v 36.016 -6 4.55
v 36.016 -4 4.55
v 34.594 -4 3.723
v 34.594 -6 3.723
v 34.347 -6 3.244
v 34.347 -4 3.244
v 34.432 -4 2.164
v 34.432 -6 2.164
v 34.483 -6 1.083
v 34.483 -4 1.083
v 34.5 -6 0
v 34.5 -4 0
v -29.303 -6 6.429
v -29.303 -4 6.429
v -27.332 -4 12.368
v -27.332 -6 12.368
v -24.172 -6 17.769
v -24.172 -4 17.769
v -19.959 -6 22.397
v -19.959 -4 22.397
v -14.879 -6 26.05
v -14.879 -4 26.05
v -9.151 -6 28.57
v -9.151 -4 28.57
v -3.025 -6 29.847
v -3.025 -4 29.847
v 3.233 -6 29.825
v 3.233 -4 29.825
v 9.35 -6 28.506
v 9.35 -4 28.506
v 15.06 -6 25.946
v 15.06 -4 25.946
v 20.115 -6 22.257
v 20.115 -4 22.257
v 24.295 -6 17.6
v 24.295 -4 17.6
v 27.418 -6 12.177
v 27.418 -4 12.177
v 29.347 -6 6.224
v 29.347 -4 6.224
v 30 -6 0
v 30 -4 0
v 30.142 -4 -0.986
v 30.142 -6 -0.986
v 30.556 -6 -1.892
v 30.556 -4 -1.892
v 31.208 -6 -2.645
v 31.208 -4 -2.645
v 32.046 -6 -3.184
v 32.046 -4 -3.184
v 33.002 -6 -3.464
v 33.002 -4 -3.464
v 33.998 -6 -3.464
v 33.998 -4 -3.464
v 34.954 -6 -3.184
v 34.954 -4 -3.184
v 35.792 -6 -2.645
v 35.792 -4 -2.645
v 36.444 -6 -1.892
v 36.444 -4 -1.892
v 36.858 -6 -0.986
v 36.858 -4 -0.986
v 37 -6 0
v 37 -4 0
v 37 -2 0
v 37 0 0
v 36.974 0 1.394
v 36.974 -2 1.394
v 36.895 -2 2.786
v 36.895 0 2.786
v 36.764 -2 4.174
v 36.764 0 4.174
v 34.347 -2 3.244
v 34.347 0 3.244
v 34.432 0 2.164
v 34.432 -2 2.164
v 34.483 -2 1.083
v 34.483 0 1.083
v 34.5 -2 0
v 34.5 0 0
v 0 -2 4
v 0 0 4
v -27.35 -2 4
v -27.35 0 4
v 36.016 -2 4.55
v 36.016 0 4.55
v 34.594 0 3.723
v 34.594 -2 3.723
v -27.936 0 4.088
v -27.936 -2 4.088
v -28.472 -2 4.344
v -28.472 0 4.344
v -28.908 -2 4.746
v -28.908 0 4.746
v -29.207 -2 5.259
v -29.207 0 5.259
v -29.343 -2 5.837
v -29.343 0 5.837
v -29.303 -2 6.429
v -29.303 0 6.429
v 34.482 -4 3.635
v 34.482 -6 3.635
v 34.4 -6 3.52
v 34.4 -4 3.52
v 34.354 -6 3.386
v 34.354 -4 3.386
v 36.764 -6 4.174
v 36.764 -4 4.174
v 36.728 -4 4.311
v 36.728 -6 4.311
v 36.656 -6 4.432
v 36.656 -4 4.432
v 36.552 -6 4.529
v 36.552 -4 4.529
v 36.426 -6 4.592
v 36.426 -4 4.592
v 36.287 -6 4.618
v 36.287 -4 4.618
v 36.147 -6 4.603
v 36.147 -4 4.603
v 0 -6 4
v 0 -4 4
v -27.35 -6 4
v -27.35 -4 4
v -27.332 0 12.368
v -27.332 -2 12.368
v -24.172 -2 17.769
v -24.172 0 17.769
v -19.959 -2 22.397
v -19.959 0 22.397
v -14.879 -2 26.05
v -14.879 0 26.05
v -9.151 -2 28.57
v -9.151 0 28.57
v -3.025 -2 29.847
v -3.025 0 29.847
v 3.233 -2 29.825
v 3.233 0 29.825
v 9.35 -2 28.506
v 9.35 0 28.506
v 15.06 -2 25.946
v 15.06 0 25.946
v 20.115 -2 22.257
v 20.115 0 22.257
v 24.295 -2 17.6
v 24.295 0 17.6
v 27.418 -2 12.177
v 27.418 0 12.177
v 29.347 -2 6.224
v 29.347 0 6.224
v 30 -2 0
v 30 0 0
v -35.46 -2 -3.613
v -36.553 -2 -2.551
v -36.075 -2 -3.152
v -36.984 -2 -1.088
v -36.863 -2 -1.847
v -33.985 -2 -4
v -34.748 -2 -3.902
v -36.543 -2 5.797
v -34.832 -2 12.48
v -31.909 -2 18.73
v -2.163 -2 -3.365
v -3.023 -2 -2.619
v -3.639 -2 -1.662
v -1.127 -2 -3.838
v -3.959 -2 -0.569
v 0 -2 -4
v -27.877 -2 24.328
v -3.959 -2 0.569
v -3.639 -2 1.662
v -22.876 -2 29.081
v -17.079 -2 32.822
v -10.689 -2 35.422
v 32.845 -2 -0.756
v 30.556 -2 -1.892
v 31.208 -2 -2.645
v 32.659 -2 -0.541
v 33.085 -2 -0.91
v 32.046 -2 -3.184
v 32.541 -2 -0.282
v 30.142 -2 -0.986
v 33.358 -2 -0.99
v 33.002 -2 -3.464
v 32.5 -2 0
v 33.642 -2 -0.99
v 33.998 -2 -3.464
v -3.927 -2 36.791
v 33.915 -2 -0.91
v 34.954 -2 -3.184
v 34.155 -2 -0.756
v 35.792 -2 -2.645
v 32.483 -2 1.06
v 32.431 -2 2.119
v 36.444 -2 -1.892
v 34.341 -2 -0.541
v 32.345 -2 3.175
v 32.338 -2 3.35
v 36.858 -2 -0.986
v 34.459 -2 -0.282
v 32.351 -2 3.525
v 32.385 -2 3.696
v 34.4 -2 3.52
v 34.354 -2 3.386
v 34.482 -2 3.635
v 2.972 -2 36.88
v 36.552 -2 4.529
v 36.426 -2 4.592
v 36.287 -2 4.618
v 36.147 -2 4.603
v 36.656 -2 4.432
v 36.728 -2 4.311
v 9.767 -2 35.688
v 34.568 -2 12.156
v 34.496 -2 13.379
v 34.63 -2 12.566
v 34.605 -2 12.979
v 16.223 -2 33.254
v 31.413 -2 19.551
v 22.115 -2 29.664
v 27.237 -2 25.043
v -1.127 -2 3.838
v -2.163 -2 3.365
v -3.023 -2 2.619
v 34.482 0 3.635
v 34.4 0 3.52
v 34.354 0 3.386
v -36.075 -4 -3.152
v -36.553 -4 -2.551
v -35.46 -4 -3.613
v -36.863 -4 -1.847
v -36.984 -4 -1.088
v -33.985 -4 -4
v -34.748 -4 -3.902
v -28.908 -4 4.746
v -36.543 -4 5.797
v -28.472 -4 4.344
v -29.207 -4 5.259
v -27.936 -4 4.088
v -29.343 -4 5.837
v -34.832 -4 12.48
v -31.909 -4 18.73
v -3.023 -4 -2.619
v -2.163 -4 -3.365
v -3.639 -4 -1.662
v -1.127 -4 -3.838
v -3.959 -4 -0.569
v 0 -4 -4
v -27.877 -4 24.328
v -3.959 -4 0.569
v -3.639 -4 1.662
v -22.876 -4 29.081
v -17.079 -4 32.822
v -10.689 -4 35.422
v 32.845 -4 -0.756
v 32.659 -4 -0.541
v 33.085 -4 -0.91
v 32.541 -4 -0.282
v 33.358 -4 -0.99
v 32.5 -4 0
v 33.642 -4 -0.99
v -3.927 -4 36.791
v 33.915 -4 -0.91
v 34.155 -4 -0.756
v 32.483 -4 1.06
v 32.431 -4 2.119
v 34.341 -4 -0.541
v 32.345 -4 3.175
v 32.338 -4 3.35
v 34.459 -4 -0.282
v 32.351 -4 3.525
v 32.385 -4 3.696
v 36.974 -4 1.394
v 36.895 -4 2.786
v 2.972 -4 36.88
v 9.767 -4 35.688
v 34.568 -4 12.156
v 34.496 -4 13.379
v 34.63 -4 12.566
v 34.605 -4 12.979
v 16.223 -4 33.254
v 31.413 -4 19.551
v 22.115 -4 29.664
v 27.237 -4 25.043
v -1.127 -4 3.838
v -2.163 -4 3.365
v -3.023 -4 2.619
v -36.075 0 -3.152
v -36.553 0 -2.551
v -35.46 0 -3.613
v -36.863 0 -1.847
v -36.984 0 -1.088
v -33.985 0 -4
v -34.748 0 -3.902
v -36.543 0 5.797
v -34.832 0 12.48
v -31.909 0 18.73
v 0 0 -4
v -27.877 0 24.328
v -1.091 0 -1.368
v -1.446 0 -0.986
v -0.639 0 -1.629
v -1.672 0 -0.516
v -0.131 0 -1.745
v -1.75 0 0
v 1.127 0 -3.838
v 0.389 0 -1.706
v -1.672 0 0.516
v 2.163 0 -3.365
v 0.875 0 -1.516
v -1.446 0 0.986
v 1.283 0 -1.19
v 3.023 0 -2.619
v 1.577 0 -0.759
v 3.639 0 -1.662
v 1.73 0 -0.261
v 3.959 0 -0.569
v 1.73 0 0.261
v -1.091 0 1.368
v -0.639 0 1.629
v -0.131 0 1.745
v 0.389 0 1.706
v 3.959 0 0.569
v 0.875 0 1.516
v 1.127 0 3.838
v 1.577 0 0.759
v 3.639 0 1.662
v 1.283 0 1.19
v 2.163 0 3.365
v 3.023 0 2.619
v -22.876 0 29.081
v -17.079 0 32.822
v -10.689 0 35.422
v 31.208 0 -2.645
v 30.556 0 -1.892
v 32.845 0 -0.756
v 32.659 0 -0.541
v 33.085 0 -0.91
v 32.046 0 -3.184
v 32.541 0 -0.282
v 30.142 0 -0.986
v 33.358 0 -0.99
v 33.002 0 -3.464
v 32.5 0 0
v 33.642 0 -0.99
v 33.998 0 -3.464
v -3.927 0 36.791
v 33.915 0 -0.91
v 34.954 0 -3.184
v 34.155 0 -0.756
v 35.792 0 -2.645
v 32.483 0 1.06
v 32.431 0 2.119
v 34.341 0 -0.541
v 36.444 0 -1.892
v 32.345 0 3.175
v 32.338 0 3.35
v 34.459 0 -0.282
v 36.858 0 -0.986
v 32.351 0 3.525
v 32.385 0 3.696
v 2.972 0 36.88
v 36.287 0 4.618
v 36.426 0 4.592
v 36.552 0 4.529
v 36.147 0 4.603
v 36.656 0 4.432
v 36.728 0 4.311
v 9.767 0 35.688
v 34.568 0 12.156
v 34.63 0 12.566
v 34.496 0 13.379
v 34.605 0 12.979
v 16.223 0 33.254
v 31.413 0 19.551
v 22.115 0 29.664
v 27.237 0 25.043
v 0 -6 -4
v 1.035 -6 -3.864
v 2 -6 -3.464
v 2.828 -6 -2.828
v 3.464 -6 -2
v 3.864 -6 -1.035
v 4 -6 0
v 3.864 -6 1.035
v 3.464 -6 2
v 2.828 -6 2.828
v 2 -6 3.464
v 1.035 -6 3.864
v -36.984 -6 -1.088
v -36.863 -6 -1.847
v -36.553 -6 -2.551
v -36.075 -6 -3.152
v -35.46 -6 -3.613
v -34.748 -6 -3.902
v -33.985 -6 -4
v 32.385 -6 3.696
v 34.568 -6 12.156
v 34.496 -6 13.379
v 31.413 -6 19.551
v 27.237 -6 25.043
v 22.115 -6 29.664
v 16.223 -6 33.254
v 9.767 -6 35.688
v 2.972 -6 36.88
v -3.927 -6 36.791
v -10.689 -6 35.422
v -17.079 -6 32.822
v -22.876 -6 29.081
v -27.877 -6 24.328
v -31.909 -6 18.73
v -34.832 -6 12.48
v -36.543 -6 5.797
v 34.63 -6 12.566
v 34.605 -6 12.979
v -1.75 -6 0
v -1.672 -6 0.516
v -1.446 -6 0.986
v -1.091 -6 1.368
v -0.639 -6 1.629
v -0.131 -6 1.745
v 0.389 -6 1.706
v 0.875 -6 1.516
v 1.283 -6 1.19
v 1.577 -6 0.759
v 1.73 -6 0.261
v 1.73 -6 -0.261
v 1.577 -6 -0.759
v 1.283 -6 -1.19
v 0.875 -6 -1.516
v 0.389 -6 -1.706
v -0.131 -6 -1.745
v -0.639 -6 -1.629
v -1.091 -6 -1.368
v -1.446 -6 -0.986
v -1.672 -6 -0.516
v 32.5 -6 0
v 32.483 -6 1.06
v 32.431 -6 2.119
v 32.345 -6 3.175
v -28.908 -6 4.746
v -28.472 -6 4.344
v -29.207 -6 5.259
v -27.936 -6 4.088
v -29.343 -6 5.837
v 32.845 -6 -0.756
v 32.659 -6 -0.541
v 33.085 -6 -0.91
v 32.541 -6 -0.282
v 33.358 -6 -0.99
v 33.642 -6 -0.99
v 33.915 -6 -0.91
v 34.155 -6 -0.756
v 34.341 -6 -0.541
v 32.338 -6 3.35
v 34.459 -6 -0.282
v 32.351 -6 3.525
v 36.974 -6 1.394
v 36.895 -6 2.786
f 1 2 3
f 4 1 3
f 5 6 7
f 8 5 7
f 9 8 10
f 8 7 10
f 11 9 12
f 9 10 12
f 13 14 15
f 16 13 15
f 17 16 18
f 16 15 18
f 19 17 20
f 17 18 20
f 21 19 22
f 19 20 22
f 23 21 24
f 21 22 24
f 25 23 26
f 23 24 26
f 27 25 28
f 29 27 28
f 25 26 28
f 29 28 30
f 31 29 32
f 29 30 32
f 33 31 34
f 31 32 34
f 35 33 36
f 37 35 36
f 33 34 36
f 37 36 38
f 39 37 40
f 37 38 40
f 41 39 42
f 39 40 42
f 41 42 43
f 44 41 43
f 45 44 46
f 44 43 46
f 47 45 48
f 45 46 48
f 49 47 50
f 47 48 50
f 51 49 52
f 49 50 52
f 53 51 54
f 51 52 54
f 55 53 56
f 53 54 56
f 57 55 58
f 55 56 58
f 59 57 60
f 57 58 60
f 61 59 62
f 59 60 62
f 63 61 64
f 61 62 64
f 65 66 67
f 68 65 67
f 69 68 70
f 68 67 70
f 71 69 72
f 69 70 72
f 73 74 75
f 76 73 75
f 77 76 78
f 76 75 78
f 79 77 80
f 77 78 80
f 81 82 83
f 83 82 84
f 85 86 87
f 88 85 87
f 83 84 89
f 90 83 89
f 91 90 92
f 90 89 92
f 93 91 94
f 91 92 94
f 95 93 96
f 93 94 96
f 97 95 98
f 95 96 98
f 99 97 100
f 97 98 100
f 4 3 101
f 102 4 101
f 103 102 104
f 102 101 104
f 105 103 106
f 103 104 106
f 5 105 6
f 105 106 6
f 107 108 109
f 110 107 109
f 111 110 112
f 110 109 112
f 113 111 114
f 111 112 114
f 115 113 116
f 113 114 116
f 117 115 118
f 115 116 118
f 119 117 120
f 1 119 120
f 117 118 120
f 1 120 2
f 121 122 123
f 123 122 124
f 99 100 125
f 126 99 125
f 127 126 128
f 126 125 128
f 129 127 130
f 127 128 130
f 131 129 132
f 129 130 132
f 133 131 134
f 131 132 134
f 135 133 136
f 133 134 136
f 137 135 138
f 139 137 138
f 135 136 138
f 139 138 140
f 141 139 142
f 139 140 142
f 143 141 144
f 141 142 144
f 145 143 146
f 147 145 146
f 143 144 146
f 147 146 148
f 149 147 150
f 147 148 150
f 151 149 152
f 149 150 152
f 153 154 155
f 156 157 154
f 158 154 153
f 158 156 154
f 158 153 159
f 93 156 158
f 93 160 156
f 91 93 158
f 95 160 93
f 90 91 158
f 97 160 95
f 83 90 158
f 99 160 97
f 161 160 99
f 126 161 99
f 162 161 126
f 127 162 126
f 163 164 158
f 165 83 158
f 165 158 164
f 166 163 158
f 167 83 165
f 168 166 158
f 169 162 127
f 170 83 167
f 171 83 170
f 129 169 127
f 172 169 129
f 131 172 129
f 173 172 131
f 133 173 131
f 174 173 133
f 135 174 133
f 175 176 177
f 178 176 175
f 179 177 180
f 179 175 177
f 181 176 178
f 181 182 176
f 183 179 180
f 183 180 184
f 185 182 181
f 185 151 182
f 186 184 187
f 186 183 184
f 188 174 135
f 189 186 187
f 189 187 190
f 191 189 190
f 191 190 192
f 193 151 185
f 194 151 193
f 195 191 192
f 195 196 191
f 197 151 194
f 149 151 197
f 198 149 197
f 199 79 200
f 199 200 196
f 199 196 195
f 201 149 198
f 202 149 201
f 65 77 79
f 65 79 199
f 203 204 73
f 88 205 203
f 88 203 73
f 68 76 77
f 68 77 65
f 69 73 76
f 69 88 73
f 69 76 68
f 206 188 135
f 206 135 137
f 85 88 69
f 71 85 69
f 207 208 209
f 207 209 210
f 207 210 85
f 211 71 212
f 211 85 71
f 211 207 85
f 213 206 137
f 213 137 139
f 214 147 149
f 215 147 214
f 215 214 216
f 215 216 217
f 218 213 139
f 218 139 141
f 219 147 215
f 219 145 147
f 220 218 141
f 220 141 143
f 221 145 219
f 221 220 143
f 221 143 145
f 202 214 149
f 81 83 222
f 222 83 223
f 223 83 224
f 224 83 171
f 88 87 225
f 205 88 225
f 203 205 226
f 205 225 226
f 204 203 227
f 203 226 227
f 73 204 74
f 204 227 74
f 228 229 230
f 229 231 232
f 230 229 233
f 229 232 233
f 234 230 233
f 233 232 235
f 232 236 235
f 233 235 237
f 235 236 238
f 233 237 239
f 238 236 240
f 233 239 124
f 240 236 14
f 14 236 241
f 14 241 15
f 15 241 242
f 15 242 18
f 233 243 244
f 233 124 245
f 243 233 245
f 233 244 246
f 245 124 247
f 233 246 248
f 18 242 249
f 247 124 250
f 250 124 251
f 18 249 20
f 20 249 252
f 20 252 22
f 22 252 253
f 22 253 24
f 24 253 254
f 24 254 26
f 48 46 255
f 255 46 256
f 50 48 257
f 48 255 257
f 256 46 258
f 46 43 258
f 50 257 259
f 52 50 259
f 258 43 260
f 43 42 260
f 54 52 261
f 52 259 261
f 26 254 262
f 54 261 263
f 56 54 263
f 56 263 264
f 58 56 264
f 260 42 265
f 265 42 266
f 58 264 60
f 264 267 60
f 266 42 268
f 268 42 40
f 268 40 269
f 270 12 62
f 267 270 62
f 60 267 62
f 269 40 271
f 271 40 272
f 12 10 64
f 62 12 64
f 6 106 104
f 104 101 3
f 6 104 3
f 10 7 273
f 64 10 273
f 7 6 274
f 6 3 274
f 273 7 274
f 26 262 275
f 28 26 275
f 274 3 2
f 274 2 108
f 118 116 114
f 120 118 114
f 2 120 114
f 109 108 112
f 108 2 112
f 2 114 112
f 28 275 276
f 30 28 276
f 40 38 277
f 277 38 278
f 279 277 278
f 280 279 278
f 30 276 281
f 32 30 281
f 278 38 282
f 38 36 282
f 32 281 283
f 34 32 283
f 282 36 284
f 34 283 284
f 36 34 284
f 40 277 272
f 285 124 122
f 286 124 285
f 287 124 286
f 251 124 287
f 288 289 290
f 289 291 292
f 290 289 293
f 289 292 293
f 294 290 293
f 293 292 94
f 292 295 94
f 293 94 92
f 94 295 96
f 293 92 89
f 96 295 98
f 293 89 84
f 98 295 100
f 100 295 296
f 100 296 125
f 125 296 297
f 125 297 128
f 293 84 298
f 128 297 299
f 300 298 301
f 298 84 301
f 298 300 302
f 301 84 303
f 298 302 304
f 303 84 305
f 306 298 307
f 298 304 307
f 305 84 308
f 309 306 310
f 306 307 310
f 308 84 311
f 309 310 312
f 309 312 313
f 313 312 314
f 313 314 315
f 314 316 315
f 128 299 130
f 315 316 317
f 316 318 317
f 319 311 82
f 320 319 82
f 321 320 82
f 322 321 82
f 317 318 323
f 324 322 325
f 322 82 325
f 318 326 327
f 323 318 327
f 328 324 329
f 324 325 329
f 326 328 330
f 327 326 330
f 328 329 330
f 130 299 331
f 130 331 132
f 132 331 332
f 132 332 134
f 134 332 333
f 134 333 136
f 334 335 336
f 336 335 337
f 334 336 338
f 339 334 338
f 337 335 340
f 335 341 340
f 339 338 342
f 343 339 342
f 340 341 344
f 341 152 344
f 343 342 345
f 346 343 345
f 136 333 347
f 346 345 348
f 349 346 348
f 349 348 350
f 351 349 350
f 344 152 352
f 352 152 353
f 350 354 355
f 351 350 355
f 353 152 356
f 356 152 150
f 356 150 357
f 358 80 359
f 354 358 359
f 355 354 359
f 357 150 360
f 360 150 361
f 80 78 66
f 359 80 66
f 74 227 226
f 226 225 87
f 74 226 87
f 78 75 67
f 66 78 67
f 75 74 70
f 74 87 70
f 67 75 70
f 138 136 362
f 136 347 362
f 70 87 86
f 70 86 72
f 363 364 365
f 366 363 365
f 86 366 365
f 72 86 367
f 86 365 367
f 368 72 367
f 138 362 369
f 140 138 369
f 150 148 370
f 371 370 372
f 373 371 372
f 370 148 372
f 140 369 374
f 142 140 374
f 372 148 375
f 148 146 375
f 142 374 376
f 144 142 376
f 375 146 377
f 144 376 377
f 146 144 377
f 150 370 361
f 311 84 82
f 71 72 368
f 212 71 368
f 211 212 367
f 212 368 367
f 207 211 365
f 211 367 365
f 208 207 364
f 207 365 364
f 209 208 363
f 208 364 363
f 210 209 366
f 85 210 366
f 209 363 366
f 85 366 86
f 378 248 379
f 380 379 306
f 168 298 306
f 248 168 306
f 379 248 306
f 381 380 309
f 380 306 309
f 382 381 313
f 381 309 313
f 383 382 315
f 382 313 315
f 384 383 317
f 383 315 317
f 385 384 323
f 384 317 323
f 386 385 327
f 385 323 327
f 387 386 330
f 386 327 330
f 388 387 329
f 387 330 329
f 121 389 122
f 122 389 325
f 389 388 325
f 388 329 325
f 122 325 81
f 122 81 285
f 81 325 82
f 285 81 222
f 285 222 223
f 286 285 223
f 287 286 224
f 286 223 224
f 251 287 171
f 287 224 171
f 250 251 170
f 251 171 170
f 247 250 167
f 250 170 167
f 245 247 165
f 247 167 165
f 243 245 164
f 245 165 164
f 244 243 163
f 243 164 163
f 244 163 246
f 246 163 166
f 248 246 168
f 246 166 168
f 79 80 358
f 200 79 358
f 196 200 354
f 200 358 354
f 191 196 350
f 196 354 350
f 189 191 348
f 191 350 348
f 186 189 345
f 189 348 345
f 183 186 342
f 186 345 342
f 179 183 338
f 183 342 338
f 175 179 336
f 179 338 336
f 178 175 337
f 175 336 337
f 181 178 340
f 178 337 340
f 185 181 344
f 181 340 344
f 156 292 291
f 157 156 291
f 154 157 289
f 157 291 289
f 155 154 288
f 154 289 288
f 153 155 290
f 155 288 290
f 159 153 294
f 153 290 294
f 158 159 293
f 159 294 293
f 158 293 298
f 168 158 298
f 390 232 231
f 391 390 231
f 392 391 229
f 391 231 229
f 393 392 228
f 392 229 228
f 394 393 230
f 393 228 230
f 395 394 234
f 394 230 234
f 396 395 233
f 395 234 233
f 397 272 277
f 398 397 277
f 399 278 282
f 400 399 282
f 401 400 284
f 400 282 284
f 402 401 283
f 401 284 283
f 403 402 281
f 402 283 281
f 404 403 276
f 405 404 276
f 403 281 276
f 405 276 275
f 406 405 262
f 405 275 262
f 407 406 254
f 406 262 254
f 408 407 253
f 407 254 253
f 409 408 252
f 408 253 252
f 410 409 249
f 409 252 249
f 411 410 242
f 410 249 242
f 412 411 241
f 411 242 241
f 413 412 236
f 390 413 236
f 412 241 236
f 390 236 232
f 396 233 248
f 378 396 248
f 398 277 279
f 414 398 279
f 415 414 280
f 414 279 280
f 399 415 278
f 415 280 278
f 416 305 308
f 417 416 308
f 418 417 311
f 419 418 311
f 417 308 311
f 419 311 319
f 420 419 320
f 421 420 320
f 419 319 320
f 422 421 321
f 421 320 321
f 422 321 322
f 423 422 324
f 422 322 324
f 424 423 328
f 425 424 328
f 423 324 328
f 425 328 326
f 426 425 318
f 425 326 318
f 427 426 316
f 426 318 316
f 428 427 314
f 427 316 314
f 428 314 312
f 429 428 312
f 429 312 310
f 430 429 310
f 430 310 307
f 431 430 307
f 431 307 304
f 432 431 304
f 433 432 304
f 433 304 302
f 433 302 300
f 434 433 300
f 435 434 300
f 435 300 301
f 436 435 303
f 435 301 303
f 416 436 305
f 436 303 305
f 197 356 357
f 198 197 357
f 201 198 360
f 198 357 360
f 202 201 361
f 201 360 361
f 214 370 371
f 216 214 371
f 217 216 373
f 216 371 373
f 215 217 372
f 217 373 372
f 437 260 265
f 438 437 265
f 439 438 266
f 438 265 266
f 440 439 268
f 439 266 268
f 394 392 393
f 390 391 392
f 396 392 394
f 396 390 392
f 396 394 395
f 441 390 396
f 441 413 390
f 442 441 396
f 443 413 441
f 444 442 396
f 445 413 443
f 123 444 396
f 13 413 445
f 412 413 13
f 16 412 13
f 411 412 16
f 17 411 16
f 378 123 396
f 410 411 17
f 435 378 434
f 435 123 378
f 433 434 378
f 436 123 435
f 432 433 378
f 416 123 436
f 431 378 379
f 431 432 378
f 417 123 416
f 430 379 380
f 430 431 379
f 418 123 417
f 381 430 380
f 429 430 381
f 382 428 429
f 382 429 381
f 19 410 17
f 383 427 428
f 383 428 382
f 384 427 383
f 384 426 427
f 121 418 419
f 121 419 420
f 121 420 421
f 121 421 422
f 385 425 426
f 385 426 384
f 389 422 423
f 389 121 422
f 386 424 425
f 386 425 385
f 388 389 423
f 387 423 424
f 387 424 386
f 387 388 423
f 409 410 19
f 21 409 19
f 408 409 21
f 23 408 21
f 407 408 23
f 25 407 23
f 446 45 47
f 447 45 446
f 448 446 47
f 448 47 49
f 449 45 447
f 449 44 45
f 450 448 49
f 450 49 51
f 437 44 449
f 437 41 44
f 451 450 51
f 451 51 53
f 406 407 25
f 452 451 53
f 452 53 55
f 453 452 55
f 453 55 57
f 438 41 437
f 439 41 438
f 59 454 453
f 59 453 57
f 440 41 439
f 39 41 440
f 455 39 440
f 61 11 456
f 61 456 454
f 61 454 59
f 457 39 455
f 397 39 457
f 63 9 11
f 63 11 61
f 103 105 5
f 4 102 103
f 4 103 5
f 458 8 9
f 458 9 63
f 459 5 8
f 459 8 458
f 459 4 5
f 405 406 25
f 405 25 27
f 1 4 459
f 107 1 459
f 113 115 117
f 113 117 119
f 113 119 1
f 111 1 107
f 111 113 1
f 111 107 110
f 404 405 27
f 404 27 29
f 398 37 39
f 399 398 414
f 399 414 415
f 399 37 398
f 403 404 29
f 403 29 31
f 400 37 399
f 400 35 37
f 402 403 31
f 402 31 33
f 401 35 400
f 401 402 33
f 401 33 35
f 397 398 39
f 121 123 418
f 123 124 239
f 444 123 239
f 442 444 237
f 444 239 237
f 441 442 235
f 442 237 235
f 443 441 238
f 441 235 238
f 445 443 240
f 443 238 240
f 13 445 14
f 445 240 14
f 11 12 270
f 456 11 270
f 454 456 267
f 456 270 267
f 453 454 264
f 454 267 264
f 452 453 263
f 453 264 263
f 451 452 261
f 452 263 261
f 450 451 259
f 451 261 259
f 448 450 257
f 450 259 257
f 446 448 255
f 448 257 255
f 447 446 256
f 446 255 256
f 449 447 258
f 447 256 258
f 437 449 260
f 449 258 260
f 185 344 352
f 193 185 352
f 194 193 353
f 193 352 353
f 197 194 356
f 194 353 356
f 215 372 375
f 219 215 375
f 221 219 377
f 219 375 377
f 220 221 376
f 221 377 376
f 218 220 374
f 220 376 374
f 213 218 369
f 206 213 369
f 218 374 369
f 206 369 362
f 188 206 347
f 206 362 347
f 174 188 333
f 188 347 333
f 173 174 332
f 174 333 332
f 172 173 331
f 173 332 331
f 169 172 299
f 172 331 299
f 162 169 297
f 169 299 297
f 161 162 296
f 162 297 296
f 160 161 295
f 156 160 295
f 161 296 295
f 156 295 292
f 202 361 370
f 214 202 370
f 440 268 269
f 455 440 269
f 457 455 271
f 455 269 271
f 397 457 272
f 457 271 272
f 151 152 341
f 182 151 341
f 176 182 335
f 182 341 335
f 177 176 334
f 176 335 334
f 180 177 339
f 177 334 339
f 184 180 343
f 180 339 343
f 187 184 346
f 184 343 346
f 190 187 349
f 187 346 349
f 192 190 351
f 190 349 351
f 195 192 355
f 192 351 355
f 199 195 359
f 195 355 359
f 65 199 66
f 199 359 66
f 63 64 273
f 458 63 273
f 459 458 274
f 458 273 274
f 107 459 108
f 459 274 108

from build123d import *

# Parameters (mm, degrees)
F1_DEPTH = 2
F3_DEPTH = 2
F5_DEPTH = 2
F6_R     = 1.75
F7_DEPTH = 6


with BuildPart() as f1:
    # F0 (on Front) → F1 (new body)
    with BuildSketch(Plane.XZ):
        with BuildLine():
            Line((36.0155949142, 4.5501915368), (34.5935707333, 3.7231953967))
            ThreePointArc((34.5935707333, 3.7231953967), (34.4002745916, 3.51961513), (34.3471502153, 3.2439593227))
            ThreePointArc((34.3471502153, 3.2439593227), (34.4617663682, 1.6237791679), (34.5, 0))
            ThreePointArc((34.5, 0), (33.5, -1), (32.5, 0))
            ThreePointArc((32.5, 0), (32.4611135591, 1.589372991), (32.344547292, 3.1749425938))
            ThreePointArc((32.344547292, 3.1749425938), (32.3418598815, 3.4374174131), (32.3849685604, 3.6963419093))
            Line((32.3849685604, 3.6963419093), (34.5683472951, 12.1558157161))
            ThreePointArc((34.5683472951, 12.1558157161), (34.6283647637, 12.7729522849), (34.4964834196, 13.3788127905))
            ThreePointArc((34.4964834196, 13.3788127905), (-7.3396727546, 36.2647101719), (-36.9839930773, -1.0882352941))
            ThreePointArc((-36.9839930773, -1.0882352941), (-36.075182574, -3.1522901619), (-33.9852909359, -4))
            Line((-33.9852909359, -4), (-29.7321374946, -4))
            Line((-29.7321374946, -4), (0, -4))
            ThreePointArc((0, -4), (4, 0), (0, 4))
            Line((0, 4), (-27.3495886624, 4))
            ThreePointArc((-27.3495886624, 4), (-28.9079761073, 4.7464336589), (-29.3031307097, 6.4285714286))
            ThreePointArc((-29.3031307097, 6.4285714286), (3.2331160442, 29.825273857), (30, 0))
            ThreePointArc((30, 0), (33.5, -3.5), (37, 0))
            ThreePointArc((37, 0), (36.9408945016, 2.0905294604), (36.7637668419, 4.1743799053))
            ThreePointArc((36.7637668419, 4.1743799053), (36.4913900405, 4.5647699812), (36.0155949142, 4.5501915368))
        make_face()
    extrude(amount=F1_DEPTH)

    # F2 (on face) → F3 (join)
    with BuildSketch(Plane.XZ.offset(2)):
        with BuildLine():
            ThreePointArc((0, -4), (2.8284271247, -2.8284271247), (4, 0))
            ThreePointArc((4, 0), (2.8284271247, 2.8284271247), (0, 4))
            ThreePointArc((0, 4), (-4, 0), (0, -4))
        make_face()
    extrude(amount=F3_DEPTH)

    # F4 (on face) → F5 (join)
    with BuildSketch(Plane.XZ.offset(4)):
        with BuildLine():
            Line((36.0155949142, 4.5501915368), (34.5935707333, 3.7231953967))
            ThreePointArc((34.5935707333, 3.7231953967), (34.4002745916, 3.51961513), (34.3471502153, 3.2439593227))
            ThreePointArc((34.3471502153, 3.2439593227), (34.4617663682, 1.6237791679), (34.5, 0))
            ThreePointArc((34.5, 0), (33.5, -1), (32.5, 0))
            ThreePointArc((32.5, 0), (32.4611135591, 1.589372991), (32.344547292, 3.1749425938))
            ThreePointArc((32.344547292, 3.1749425938), (32.3418598815, 3.4374174131), (32.3849685604, 3.6963419093))
            Line((32.3849685604, 3.6963419093), (34.5683472951, 12.1558157161))
            ThreePointArc((34.5683472951, 12.1558157161), (34.6283647637, 12.7729522849), (34.4964834196, 13.3788127905))
            ThreePointArc((34.4964834196, 13.3788127905), (-7.3396727546, 36.2647101719), (-36.9839930773, -1.0882352941))
            ThreePointArc((-36.9839930773, -1.0882352941), (-36.075182574, -3.1522901619), (-33.9852909359, -4))
            Line((-33.9852909359, -4), (-29.7321374946, -4))
            Line((-29.7321374946, -4), (0, -4))
            ThreePointArc((0, -4), (-4, 0), (0, 4))
            Line((0, 4), (-27.3495886624, 4))
            ThreePointArc((-27.3495886624, 4), (-28.9079761073, 4.7464336589), (-29.3031307097, 6.4285714286))
            ThreePointArc((-29.3031307097, 6.4285714286), (3.2331160442, 29.825273857), (30, 0))
            ThreePointArc((30, 0), (33.5, -3.5), (37, 0))
            ThreePointArc((37, 0), (36.9408945016, 2.0905294604), (36.7637668419, 4.1743799053))
            ThreePointArc((36.7637668419, 4.1743799053), (36.4913900405, 4.5647699812), (36.0155949142, 4.5501915368))
        make_face()
        with BuildLine():
            ThreePointArc((4, 0), (2.8284271247, 2.8284271247), (0, 4))
            ThreePointArc((0, 4), (-4, 0), (0, -4))
            ThreePointArc((0, -4), (2.8284271247, -2.8284271247), (4, 0))
        make_face()
    extrude(amount=F5_DEPTH)

    # F6 (on face) → F7 (cut)
    with BuildSketch(Plane(origin=(0, 0, 0), x_dir=(-1, 0, 0), z_dir=(0, 1, 0))):
        Circle(F6_R)
    extrude(amount=-F7_DEPTH, mode=Mode.SUBTRACT)


solid = f1.part
